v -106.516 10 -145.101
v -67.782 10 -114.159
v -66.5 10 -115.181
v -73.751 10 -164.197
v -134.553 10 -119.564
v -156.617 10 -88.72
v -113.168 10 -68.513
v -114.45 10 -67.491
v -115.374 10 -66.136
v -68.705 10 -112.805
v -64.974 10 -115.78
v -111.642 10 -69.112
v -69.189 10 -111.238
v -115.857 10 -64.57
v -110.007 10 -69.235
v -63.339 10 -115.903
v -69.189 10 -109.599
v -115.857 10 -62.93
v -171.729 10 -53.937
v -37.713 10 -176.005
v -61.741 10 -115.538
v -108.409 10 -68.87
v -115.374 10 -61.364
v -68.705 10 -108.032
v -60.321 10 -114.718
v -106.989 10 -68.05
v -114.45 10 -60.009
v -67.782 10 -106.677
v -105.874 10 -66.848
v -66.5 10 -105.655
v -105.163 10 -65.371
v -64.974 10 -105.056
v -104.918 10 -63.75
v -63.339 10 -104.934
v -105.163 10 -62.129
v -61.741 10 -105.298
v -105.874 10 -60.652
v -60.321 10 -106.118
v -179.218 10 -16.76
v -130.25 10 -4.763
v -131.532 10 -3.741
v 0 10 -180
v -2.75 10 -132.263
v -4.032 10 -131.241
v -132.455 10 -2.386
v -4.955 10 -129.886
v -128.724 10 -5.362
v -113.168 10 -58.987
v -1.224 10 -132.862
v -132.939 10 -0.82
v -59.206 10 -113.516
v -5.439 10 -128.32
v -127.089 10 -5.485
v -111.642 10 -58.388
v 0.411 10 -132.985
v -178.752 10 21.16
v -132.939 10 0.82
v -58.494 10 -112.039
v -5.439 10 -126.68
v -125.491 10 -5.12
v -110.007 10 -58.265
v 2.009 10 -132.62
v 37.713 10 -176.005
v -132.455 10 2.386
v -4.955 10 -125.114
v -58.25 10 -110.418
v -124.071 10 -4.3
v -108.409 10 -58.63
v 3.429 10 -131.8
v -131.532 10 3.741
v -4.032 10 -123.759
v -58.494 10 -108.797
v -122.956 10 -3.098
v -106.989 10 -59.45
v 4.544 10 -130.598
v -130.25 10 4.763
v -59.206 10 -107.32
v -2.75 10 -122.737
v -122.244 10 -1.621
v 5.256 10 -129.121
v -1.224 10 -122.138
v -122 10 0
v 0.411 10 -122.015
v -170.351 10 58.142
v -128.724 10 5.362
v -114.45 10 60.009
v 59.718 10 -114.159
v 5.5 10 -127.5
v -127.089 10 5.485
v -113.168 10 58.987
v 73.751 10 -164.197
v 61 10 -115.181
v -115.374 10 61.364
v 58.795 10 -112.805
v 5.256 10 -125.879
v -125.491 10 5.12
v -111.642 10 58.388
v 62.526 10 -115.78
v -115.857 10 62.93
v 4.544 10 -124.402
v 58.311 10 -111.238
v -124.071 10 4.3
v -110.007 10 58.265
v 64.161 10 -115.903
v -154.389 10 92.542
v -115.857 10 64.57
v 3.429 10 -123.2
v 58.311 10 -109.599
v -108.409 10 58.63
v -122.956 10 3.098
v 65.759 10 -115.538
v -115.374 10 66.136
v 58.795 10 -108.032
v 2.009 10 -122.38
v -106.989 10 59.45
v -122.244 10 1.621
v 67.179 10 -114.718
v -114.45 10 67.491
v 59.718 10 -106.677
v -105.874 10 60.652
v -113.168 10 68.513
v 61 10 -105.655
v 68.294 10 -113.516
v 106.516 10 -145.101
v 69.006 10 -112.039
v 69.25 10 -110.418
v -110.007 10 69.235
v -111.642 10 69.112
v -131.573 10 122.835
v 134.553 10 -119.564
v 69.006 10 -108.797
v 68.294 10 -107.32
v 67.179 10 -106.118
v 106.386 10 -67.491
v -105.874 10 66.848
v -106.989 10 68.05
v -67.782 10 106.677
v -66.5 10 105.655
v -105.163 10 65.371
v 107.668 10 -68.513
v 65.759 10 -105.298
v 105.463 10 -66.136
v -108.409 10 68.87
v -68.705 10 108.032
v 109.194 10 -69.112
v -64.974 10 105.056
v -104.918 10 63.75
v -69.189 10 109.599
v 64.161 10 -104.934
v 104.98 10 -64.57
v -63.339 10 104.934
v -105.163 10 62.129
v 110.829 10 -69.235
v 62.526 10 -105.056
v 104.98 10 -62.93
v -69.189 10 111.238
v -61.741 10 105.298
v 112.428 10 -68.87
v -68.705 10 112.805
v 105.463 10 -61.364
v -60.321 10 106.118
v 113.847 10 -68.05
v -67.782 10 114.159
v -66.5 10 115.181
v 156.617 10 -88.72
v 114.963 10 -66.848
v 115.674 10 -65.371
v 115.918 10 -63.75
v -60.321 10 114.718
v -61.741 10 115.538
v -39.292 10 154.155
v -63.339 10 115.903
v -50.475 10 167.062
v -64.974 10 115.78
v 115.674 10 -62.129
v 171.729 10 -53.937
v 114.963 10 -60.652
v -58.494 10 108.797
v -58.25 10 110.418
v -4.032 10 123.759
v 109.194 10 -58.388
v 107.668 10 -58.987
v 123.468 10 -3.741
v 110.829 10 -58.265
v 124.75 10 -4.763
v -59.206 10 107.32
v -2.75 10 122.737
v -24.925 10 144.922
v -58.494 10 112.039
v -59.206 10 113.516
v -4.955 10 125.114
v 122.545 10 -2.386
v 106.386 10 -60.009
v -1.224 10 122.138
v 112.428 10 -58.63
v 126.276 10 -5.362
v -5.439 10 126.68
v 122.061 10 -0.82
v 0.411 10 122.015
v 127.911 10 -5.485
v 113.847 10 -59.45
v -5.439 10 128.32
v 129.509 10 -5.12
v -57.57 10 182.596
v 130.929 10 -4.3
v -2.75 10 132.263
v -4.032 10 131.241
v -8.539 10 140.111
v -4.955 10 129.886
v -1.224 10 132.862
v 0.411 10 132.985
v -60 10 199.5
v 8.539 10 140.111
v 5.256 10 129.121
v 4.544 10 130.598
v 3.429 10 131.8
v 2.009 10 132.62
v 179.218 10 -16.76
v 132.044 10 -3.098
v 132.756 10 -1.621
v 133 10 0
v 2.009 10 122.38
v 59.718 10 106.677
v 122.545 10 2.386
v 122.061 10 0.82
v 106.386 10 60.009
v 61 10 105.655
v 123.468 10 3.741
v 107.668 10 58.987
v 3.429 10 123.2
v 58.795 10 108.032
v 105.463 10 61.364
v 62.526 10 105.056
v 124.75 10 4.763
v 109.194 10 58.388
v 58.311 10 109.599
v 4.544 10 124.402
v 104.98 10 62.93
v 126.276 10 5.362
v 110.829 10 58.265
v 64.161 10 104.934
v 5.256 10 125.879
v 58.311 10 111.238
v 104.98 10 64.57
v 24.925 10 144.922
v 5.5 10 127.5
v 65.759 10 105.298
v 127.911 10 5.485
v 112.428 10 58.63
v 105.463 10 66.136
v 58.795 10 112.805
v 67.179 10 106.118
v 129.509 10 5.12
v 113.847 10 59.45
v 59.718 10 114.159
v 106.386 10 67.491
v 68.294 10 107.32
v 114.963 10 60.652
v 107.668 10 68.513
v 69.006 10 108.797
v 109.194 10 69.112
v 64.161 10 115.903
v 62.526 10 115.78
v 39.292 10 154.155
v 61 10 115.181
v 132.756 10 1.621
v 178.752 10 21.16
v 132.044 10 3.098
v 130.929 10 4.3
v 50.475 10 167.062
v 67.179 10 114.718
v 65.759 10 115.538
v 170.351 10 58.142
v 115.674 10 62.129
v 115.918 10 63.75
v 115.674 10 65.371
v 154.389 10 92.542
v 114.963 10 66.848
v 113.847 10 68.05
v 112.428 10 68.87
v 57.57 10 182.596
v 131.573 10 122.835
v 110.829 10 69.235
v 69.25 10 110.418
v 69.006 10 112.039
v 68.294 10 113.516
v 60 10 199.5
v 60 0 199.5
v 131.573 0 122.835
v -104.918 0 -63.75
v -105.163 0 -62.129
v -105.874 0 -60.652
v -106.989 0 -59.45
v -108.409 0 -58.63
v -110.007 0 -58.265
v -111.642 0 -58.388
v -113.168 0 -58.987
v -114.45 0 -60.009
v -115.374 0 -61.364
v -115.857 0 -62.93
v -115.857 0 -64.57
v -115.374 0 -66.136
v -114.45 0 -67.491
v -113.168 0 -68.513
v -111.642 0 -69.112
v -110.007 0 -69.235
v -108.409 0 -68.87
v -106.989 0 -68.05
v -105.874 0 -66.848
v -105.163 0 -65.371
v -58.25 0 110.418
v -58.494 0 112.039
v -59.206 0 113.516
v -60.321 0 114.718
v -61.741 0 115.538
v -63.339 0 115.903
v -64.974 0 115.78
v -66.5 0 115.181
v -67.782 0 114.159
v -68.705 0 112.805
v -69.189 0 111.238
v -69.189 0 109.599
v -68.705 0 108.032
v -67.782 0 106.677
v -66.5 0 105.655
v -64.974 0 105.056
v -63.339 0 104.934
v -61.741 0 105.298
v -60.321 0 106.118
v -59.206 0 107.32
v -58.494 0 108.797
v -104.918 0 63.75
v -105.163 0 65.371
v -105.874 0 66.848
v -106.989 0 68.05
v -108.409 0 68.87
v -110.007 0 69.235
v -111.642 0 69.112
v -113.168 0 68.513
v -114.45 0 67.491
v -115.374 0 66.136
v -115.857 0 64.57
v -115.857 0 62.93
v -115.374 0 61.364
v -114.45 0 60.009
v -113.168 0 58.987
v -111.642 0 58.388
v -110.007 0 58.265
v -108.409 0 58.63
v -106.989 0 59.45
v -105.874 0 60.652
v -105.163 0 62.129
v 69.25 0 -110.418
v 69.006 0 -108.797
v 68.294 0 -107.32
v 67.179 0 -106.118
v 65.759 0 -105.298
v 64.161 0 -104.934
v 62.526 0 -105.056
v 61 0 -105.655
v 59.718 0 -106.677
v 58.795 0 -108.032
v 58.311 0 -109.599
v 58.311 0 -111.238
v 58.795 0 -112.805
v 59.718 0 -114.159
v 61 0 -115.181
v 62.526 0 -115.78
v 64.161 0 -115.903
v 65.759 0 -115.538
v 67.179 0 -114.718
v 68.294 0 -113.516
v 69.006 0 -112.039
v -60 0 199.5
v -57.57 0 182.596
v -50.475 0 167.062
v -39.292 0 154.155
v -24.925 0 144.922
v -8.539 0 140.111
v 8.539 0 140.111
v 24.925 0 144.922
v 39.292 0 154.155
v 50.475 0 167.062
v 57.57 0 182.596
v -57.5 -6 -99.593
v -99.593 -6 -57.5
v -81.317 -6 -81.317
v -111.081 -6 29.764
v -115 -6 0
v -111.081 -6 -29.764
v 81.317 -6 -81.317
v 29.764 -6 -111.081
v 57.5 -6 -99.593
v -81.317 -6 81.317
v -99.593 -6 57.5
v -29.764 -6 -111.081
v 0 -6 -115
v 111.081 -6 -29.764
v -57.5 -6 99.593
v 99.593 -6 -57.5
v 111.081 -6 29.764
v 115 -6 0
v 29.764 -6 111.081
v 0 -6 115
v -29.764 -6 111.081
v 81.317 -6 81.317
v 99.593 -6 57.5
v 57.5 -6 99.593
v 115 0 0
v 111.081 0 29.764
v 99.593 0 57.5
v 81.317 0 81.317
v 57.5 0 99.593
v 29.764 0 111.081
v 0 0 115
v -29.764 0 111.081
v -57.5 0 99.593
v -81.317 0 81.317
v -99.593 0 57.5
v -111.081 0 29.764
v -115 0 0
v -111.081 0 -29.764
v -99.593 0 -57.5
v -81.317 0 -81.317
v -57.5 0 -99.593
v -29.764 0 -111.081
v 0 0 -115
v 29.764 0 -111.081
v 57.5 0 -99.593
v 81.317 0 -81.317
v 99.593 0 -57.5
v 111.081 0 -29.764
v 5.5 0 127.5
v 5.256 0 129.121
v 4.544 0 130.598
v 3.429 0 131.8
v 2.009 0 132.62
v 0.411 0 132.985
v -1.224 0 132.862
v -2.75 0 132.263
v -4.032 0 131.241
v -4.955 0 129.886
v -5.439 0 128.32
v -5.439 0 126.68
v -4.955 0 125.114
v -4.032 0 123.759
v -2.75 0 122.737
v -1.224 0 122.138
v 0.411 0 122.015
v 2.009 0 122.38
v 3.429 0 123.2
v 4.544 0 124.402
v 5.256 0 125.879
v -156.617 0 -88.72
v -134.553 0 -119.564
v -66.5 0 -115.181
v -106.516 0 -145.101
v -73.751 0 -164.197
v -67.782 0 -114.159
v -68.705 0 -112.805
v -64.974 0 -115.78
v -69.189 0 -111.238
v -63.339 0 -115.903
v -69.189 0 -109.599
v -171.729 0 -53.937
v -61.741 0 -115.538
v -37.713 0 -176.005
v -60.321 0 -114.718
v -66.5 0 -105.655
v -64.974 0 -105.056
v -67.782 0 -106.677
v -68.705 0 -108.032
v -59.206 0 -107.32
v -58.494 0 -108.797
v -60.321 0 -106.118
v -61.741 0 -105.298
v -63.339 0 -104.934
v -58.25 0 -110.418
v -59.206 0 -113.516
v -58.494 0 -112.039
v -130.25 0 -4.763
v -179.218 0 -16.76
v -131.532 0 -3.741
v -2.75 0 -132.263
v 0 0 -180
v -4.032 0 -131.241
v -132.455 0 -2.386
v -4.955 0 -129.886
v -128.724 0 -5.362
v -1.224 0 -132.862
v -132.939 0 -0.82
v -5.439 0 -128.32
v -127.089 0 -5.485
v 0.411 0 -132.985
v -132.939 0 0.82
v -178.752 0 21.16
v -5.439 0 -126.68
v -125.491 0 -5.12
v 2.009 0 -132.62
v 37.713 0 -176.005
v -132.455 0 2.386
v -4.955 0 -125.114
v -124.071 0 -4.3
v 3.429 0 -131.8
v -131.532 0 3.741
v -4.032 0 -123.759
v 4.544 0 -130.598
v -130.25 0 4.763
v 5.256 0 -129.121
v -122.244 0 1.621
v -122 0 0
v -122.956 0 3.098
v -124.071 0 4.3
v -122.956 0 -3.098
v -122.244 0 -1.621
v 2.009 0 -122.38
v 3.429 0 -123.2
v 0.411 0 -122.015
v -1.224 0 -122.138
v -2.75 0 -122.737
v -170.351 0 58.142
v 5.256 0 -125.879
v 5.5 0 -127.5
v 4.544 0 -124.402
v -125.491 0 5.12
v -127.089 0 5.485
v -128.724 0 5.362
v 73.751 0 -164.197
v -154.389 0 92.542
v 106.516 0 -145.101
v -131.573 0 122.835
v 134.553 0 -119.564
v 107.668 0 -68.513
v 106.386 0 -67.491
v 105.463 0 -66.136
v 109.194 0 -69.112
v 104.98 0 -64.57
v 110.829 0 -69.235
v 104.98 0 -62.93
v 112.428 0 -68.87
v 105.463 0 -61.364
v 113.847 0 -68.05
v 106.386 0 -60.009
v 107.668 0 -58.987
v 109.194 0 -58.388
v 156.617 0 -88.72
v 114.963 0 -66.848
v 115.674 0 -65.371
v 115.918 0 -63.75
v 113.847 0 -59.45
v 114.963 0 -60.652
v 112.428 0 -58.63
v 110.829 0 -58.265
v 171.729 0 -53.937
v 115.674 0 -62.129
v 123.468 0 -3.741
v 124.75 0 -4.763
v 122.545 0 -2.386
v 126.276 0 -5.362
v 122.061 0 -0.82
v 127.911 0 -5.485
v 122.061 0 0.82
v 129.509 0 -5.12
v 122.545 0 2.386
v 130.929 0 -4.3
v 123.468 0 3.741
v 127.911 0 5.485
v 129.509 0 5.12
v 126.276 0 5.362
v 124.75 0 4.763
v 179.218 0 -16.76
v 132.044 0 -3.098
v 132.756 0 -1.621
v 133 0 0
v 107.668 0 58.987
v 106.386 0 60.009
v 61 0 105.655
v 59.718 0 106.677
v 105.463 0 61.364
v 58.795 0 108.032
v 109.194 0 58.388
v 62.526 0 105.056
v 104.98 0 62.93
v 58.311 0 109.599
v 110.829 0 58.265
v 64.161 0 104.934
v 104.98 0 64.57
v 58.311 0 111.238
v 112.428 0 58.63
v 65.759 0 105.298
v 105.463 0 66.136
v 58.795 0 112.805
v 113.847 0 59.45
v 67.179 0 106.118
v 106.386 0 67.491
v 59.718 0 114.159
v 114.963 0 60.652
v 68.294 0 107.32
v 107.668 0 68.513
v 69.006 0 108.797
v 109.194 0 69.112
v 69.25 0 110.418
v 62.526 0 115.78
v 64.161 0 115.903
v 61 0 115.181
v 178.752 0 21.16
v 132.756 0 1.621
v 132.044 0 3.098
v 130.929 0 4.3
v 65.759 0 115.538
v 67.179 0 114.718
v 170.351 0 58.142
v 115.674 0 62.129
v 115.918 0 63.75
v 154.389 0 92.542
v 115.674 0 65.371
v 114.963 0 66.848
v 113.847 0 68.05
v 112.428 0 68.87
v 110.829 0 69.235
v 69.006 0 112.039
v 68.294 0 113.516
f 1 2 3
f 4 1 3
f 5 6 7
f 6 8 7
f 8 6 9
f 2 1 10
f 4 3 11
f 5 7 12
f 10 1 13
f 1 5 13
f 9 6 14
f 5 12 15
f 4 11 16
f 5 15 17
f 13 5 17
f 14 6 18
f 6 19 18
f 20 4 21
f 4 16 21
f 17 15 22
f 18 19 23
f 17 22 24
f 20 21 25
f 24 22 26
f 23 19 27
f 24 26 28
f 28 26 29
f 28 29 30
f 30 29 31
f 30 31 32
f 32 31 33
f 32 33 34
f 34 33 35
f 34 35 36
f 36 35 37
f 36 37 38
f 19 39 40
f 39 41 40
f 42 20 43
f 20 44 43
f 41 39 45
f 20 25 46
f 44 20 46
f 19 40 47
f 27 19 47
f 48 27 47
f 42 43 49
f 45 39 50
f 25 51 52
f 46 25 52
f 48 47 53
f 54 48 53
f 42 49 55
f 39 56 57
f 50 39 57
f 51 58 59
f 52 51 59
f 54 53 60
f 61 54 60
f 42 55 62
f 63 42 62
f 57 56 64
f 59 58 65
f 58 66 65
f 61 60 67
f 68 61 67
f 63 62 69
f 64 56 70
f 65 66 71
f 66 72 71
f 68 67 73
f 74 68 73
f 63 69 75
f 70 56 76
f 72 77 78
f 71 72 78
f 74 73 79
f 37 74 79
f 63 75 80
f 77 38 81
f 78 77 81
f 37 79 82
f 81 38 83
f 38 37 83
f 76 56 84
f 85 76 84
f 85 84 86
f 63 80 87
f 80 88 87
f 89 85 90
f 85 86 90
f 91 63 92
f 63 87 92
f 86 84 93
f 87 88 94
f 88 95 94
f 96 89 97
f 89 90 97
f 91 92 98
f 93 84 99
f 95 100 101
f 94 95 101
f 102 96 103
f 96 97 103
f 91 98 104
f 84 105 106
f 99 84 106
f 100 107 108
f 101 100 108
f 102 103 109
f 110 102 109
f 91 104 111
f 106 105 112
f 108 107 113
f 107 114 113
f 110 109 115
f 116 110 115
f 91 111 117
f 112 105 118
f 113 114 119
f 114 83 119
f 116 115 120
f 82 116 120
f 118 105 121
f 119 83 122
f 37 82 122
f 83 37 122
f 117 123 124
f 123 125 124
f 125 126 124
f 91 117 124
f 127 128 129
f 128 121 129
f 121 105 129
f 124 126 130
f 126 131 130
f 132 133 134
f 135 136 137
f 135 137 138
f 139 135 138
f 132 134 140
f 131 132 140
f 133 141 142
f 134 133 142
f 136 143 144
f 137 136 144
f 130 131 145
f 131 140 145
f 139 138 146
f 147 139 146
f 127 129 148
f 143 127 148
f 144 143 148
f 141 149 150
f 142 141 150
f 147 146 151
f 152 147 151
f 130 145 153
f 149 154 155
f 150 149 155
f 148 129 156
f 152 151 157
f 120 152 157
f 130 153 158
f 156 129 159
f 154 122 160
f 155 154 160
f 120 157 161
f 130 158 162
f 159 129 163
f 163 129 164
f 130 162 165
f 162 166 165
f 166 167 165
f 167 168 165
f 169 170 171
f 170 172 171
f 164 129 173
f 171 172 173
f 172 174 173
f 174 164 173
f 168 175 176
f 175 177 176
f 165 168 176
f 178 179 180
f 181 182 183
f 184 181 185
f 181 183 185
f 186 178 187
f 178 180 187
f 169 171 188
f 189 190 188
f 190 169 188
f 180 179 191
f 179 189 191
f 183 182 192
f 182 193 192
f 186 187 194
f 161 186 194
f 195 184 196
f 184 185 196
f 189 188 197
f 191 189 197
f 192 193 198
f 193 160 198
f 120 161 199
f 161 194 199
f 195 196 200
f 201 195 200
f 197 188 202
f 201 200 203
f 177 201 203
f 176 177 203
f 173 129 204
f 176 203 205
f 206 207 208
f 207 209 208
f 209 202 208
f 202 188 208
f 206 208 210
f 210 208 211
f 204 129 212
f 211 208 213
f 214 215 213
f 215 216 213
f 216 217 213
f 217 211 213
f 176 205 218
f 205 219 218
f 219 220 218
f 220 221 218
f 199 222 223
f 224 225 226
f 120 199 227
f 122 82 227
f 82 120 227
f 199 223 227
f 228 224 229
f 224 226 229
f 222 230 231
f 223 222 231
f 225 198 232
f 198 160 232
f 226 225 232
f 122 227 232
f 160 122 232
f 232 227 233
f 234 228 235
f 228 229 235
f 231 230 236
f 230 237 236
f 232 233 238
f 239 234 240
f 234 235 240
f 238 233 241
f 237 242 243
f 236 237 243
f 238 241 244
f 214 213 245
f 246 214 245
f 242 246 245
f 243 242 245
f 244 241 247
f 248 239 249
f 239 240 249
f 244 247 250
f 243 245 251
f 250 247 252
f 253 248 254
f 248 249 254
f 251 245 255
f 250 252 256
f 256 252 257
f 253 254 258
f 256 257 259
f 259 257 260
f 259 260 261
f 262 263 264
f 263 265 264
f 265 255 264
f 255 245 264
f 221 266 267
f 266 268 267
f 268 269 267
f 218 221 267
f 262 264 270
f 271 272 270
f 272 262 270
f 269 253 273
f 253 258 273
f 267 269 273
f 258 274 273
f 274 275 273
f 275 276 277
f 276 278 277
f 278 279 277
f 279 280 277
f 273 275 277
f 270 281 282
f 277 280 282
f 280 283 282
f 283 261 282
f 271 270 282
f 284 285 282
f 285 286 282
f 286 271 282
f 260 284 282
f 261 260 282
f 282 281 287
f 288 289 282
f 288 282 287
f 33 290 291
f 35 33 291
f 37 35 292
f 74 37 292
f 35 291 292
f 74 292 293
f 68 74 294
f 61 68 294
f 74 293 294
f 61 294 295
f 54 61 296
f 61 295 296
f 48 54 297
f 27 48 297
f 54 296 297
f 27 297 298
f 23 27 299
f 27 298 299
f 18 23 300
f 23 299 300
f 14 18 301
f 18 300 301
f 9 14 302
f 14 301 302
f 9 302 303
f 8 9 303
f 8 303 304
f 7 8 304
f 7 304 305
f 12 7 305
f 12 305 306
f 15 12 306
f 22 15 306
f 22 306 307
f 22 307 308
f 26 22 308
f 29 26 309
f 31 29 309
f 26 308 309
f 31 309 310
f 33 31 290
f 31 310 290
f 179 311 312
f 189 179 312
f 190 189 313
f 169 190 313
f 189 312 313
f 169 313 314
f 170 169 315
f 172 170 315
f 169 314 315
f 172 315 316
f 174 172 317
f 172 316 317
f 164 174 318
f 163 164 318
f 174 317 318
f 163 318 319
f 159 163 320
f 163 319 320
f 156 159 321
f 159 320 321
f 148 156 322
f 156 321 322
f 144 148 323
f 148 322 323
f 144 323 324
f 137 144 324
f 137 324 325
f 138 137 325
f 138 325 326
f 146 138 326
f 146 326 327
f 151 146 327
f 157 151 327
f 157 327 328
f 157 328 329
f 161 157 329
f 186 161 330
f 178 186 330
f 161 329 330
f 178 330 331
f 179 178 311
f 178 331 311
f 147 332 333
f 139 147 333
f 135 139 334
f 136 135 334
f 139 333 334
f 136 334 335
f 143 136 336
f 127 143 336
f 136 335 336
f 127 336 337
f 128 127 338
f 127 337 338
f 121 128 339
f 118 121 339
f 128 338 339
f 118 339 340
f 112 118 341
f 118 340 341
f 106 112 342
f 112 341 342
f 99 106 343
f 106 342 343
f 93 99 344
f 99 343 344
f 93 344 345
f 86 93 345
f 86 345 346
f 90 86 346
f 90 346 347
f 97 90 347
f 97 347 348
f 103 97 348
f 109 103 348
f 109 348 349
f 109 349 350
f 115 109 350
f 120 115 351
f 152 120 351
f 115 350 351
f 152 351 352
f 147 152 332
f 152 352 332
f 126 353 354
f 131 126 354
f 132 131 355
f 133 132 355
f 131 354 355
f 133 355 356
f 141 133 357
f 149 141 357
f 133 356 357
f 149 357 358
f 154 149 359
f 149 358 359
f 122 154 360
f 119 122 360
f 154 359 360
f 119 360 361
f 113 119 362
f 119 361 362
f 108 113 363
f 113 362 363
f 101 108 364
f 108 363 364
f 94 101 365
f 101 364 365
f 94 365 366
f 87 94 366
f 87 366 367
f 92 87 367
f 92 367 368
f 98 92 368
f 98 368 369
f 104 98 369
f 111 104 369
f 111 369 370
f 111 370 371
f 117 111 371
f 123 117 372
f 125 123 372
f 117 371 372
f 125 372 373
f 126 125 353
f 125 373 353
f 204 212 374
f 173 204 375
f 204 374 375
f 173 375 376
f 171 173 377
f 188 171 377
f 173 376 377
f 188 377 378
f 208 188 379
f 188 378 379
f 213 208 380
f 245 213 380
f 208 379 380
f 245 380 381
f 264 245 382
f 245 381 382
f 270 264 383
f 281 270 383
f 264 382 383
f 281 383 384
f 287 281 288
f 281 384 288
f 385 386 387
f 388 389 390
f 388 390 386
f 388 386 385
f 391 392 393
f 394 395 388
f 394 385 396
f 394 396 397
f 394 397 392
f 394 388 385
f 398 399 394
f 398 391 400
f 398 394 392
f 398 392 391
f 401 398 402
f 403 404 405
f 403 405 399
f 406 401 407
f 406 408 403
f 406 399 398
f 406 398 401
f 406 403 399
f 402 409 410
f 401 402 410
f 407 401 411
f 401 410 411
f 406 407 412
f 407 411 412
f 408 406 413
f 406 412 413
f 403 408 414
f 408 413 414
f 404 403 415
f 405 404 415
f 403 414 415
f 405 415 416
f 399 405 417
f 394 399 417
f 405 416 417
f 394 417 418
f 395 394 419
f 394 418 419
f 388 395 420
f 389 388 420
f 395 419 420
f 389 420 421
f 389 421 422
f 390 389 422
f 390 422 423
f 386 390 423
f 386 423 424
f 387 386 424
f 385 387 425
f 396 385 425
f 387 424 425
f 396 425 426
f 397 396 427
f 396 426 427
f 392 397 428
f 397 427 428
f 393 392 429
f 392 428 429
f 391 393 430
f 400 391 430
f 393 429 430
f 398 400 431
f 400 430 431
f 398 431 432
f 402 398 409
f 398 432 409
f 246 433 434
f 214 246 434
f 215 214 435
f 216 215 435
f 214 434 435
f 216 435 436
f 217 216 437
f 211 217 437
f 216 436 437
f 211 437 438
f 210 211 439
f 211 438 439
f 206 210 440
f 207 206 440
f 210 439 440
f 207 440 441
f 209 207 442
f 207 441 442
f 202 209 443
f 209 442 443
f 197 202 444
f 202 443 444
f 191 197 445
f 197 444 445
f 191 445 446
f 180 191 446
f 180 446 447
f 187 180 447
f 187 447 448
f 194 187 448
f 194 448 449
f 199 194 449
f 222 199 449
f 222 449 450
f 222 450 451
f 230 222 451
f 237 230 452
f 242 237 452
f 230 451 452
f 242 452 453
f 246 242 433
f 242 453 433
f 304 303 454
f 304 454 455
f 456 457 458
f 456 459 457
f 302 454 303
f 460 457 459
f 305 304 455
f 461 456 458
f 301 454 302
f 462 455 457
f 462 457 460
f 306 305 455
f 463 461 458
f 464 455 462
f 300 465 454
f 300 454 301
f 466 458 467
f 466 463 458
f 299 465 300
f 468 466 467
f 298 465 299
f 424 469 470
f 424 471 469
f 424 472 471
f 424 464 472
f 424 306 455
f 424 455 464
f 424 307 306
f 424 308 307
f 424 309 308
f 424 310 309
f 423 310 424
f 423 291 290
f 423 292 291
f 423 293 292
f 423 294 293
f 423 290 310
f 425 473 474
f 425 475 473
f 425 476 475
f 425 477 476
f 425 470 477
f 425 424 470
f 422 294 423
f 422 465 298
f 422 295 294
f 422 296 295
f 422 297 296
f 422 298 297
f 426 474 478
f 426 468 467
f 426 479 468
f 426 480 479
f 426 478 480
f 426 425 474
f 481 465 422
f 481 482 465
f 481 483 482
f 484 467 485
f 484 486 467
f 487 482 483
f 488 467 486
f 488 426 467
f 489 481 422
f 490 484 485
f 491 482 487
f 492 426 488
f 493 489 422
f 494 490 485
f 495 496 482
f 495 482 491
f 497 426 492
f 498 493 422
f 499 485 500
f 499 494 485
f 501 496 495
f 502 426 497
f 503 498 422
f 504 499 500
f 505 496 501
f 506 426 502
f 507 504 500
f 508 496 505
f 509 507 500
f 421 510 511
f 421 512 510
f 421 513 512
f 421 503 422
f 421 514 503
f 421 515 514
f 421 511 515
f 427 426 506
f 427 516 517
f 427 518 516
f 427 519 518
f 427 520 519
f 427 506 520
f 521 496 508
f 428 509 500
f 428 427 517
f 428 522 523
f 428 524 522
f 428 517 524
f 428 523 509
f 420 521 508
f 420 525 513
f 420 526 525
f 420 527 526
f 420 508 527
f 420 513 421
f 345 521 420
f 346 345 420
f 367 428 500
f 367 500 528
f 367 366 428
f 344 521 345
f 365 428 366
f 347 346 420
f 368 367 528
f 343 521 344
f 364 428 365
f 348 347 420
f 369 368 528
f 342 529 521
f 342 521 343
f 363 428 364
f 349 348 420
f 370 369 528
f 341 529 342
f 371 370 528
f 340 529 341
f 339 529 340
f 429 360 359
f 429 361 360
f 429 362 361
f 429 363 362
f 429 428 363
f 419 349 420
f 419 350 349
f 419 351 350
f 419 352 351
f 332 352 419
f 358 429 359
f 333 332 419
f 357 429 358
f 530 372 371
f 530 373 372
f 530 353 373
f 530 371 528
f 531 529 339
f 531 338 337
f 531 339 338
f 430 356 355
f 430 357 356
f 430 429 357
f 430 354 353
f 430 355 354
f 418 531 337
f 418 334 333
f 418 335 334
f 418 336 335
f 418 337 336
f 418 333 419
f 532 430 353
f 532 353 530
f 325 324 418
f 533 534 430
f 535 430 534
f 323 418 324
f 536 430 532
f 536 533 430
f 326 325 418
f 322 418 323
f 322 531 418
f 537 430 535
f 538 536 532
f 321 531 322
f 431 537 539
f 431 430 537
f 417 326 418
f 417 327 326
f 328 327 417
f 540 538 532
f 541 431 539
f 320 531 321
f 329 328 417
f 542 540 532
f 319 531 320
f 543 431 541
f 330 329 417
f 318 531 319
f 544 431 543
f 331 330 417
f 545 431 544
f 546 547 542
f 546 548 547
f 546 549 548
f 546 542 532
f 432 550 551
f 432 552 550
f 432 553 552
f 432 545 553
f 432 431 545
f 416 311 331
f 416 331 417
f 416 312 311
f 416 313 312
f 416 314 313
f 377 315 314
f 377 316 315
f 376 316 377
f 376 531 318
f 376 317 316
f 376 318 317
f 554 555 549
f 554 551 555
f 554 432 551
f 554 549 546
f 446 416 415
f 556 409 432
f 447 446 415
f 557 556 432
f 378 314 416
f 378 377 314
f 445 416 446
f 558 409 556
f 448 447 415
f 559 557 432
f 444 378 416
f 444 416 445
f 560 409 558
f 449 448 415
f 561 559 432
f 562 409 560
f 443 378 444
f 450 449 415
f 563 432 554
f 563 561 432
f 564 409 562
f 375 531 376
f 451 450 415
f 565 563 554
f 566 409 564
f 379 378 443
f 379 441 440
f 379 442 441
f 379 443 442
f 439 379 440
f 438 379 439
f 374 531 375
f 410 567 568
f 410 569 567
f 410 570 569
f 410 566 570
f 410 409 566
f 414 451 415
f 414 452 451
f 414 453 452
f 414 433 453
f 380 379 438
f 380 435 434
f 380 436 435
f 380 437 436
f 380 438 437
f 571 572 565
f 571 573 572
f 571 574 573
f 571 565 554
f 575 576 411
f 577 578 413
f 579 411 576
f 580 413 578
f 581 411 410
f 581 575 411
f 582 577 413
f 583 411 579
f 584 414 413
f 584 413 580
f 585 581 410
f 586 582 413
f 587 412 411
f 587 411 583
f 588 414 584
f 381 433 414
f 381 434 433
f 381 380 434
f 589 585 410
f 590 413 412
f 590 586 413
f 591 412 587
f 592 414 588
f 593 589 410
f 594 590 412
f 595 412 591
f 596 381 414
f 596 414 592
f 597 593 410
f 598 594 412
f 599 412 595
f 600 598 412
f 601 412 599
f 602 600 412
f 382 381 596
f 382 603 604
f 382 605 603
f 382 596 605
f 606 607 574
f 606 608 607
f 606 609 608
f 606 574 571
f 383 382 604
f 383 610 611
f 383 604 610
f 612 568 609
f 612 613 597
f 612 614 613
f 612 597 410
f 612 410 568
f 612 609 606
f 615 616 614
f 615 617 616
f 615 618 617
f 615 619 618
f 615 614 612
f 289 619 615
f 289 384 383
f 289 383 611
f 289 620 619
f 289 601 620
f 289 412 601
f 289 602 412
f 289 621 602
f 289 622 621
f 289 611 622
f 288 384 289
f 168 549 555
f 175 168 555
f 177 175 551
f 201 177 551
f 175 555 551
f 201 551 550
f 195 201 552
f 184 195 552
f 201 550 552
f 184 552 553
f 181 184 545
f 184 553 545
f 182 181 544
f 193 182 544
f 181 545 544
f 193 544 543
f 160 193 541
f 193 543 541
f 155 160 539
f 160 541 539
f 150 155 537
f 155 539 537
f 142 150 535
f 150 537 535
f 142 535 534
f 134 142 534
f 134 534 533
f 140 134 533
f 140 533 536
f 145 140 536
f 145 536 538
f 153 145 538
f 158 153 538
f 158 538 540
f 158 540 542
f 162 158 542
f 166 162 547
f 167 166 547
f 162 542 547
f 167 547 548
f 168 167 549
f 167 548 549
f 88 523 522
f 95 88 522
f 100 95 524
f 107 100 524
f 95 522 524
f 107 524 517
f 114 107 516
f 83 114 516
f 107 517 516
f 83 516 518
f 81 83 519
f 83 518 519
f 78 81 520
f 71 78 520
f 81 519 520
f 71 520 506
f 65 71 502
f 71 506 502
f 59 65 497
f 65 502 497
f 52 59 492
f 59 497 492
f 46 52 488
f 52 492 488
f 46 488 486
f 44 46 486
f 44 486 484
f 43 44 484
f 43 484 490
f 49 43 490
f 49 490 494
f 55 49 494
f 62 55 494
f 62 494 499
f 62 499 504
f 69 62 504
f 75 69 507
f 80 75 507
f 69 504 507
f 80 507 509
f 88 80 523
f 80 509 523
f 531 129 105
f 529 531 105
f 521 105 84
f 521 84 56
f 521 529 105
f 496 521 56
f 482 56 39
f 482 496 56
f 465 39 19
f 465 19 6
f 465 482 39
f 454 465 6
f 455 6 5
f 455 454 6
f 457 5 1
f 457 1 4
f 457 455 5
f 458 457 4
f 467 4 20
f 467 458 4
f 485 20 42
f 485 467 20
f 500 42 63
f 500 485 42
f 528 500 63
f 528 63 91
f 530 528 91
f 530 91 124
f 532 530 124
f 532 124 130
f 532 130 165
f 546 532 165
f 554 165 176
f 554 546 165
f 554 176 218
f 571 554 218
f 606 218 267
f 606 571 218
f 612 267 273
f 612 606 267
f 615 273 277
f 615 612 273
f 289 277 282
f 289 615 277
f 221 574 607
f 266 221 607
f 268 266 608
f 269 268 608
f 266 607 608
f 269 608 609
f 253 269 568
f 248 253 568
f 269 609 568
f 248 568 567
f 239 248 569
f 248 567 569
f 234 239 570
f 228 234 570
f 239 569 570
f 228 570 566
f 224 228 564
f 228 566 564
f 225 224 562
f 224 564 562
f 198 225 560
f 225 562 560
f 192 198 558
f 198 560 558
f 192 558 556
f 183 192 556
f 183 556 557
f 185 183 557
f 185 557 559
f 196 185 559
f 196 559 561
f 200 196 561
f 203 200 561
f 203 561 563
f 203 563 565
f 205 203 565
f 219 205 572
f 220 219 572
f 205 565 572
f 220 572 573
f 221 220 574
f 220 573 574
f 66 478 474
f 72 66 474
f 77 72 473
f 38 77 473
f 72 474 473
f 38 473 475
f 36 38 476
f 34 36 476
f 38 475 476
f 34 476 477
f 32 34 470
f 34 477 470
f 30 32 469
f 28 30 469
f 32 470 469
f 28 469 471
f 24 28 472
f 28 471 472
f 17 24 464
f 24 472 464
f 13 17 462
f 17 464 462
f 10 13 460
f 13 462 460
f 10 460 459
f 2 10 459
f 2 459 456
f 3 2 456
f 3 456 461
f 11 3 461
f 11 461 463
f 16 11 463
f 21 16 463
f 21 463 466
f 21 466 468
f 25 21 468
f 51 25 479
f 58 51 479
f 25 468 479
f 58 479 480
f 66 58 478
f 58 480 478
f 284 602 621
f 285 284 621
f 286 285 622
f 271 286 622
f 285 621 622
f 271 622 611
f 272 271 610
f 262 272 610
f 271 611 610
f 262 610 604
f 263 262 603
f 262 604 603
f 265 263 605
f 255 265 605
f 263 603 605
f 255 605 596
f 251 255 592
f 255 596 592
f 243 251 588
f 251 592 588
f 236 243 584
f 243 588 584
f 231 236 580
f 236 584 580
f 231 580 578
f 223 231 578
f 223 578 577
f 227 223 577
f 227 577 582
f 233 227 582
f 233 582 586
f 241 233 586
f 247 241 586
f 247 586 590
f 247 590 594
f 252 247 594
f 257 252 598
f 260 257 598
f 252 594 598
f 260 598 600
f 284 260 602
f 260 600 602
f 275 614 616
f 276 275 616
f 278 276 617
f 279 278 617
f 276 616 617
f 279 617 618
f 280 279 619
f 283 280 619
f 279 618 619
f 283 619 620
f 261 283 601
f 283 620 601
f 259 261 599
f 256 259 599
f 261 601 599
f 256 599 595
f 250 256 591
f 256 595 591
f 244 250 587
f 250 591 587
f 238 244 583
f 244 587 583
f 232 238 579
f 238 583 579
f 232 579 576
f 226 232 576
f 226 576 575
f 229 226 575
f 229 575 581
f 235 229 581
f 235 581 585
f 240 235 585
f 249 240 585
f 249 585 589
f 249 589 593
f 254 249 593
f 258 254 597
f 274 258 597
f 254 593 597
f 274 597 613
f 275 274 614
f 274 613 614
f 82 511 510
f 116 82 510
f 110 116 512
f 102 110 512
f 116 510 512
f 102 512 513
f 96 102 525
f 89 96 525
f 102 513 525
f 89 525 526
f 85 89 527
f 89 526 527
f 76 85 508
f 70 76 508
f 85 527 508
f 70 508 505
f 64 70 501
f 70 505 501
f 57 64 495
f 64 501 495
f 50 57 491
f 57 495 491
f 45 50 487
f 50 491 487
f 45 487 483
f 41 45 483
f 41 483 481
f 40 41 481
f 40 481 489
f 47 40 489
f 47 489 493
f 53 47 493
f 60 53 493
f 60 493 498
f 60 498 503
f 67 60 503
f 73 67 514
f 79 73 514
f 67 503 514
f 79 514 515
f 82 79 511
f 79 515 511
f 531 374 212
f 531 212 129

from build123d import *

# Parameters (mm, degrees)
F1_DEPTH = 10
F3_DEPTH = 10
F4_R     = 115
F5_DEPTH = 6
F6_R     = 5.5
F7_DEPTH = 10


with BuildPart() as f1:
    # F0 (on Front) → F1 (new body)
    with BuildSketch(Plane.XZ):
        with BuildLine():
            Line((-60, 199.5), (-131.5733290036, 122.8350890215))
            ThreePointArc((-131.5733290036, 122.8350890215), (0, -180), (131.5733290036, 122.8350890215))
            Line((131.5733290036, 122.8350890215), (60, 199.5))
            Line((60, 199.5), (0, 199.5))
            Line((0, 199.5), (-60, 199.5))
        make_face()
    extrude(amount=-F1_DEPTH)

    # F2 (on face) → F3 (cut, through all)
    with BuildSketch(Plane.XZ):
        with BuildLine():
            Line((-60, 199.5), (60, 199.5))
            ThreePointArc((60, 199.5), (0, 259.5), (-60, 199.5))
        make_face()
        with BuildLine():
            ThreePointArc((-60, 199.5), (0, 139.5), (60, 199.5))
            Line((60, 199.5), (-60, 199.5))
        make_face()
    extrude(amount=-F3_DEPTH, mode=Mode.SUBTRACT)

    # F4 (on face) → F5 (join)
    with BuildSketch(Plane.XZ):
        Circle(F4_R)
    extrude(amount=F5_DEPTH)

    # F6 (on face) → F7 (cut, through all)
    with BuildSketch(Plane.XZ):
        with Locations((-63.75, 110.4182389825)):
            Circle(F6_R)
        with Locations((0, 127.5)):
            Circle(F6_R)
        with Locations((63.75, 110.4182389825)):
            Circle(F6_R)
        with Locations((110.4182389825, 63.75)):
            Circle(F6_R)
        with Locations((127.5, 0)):
            Circle(F6_R)
        with Locations((110.4182389825, -63.75)):
            Circle(F6_R)
        with Locations((63.75, -110.4182389825)):
            Circle(F6_R)
        with Locations((0, -127.5)):
            Circle(F6_R)
        with Locations((-63.75, -110.4182389825)):
            Circle(F6_R)
        with Locations((-110.4182389825, -63.75)):
            Circle(F6_R)
        with Locations((-127.5, 0)):
            Circle(F6_R)
        with Locations((-110.4182389825, 63.75)):
            Circle(F6_R)
    extrude(amount=-F7_DEPTH, mode=Mode.SUBTRACT)


solid = f1.part
